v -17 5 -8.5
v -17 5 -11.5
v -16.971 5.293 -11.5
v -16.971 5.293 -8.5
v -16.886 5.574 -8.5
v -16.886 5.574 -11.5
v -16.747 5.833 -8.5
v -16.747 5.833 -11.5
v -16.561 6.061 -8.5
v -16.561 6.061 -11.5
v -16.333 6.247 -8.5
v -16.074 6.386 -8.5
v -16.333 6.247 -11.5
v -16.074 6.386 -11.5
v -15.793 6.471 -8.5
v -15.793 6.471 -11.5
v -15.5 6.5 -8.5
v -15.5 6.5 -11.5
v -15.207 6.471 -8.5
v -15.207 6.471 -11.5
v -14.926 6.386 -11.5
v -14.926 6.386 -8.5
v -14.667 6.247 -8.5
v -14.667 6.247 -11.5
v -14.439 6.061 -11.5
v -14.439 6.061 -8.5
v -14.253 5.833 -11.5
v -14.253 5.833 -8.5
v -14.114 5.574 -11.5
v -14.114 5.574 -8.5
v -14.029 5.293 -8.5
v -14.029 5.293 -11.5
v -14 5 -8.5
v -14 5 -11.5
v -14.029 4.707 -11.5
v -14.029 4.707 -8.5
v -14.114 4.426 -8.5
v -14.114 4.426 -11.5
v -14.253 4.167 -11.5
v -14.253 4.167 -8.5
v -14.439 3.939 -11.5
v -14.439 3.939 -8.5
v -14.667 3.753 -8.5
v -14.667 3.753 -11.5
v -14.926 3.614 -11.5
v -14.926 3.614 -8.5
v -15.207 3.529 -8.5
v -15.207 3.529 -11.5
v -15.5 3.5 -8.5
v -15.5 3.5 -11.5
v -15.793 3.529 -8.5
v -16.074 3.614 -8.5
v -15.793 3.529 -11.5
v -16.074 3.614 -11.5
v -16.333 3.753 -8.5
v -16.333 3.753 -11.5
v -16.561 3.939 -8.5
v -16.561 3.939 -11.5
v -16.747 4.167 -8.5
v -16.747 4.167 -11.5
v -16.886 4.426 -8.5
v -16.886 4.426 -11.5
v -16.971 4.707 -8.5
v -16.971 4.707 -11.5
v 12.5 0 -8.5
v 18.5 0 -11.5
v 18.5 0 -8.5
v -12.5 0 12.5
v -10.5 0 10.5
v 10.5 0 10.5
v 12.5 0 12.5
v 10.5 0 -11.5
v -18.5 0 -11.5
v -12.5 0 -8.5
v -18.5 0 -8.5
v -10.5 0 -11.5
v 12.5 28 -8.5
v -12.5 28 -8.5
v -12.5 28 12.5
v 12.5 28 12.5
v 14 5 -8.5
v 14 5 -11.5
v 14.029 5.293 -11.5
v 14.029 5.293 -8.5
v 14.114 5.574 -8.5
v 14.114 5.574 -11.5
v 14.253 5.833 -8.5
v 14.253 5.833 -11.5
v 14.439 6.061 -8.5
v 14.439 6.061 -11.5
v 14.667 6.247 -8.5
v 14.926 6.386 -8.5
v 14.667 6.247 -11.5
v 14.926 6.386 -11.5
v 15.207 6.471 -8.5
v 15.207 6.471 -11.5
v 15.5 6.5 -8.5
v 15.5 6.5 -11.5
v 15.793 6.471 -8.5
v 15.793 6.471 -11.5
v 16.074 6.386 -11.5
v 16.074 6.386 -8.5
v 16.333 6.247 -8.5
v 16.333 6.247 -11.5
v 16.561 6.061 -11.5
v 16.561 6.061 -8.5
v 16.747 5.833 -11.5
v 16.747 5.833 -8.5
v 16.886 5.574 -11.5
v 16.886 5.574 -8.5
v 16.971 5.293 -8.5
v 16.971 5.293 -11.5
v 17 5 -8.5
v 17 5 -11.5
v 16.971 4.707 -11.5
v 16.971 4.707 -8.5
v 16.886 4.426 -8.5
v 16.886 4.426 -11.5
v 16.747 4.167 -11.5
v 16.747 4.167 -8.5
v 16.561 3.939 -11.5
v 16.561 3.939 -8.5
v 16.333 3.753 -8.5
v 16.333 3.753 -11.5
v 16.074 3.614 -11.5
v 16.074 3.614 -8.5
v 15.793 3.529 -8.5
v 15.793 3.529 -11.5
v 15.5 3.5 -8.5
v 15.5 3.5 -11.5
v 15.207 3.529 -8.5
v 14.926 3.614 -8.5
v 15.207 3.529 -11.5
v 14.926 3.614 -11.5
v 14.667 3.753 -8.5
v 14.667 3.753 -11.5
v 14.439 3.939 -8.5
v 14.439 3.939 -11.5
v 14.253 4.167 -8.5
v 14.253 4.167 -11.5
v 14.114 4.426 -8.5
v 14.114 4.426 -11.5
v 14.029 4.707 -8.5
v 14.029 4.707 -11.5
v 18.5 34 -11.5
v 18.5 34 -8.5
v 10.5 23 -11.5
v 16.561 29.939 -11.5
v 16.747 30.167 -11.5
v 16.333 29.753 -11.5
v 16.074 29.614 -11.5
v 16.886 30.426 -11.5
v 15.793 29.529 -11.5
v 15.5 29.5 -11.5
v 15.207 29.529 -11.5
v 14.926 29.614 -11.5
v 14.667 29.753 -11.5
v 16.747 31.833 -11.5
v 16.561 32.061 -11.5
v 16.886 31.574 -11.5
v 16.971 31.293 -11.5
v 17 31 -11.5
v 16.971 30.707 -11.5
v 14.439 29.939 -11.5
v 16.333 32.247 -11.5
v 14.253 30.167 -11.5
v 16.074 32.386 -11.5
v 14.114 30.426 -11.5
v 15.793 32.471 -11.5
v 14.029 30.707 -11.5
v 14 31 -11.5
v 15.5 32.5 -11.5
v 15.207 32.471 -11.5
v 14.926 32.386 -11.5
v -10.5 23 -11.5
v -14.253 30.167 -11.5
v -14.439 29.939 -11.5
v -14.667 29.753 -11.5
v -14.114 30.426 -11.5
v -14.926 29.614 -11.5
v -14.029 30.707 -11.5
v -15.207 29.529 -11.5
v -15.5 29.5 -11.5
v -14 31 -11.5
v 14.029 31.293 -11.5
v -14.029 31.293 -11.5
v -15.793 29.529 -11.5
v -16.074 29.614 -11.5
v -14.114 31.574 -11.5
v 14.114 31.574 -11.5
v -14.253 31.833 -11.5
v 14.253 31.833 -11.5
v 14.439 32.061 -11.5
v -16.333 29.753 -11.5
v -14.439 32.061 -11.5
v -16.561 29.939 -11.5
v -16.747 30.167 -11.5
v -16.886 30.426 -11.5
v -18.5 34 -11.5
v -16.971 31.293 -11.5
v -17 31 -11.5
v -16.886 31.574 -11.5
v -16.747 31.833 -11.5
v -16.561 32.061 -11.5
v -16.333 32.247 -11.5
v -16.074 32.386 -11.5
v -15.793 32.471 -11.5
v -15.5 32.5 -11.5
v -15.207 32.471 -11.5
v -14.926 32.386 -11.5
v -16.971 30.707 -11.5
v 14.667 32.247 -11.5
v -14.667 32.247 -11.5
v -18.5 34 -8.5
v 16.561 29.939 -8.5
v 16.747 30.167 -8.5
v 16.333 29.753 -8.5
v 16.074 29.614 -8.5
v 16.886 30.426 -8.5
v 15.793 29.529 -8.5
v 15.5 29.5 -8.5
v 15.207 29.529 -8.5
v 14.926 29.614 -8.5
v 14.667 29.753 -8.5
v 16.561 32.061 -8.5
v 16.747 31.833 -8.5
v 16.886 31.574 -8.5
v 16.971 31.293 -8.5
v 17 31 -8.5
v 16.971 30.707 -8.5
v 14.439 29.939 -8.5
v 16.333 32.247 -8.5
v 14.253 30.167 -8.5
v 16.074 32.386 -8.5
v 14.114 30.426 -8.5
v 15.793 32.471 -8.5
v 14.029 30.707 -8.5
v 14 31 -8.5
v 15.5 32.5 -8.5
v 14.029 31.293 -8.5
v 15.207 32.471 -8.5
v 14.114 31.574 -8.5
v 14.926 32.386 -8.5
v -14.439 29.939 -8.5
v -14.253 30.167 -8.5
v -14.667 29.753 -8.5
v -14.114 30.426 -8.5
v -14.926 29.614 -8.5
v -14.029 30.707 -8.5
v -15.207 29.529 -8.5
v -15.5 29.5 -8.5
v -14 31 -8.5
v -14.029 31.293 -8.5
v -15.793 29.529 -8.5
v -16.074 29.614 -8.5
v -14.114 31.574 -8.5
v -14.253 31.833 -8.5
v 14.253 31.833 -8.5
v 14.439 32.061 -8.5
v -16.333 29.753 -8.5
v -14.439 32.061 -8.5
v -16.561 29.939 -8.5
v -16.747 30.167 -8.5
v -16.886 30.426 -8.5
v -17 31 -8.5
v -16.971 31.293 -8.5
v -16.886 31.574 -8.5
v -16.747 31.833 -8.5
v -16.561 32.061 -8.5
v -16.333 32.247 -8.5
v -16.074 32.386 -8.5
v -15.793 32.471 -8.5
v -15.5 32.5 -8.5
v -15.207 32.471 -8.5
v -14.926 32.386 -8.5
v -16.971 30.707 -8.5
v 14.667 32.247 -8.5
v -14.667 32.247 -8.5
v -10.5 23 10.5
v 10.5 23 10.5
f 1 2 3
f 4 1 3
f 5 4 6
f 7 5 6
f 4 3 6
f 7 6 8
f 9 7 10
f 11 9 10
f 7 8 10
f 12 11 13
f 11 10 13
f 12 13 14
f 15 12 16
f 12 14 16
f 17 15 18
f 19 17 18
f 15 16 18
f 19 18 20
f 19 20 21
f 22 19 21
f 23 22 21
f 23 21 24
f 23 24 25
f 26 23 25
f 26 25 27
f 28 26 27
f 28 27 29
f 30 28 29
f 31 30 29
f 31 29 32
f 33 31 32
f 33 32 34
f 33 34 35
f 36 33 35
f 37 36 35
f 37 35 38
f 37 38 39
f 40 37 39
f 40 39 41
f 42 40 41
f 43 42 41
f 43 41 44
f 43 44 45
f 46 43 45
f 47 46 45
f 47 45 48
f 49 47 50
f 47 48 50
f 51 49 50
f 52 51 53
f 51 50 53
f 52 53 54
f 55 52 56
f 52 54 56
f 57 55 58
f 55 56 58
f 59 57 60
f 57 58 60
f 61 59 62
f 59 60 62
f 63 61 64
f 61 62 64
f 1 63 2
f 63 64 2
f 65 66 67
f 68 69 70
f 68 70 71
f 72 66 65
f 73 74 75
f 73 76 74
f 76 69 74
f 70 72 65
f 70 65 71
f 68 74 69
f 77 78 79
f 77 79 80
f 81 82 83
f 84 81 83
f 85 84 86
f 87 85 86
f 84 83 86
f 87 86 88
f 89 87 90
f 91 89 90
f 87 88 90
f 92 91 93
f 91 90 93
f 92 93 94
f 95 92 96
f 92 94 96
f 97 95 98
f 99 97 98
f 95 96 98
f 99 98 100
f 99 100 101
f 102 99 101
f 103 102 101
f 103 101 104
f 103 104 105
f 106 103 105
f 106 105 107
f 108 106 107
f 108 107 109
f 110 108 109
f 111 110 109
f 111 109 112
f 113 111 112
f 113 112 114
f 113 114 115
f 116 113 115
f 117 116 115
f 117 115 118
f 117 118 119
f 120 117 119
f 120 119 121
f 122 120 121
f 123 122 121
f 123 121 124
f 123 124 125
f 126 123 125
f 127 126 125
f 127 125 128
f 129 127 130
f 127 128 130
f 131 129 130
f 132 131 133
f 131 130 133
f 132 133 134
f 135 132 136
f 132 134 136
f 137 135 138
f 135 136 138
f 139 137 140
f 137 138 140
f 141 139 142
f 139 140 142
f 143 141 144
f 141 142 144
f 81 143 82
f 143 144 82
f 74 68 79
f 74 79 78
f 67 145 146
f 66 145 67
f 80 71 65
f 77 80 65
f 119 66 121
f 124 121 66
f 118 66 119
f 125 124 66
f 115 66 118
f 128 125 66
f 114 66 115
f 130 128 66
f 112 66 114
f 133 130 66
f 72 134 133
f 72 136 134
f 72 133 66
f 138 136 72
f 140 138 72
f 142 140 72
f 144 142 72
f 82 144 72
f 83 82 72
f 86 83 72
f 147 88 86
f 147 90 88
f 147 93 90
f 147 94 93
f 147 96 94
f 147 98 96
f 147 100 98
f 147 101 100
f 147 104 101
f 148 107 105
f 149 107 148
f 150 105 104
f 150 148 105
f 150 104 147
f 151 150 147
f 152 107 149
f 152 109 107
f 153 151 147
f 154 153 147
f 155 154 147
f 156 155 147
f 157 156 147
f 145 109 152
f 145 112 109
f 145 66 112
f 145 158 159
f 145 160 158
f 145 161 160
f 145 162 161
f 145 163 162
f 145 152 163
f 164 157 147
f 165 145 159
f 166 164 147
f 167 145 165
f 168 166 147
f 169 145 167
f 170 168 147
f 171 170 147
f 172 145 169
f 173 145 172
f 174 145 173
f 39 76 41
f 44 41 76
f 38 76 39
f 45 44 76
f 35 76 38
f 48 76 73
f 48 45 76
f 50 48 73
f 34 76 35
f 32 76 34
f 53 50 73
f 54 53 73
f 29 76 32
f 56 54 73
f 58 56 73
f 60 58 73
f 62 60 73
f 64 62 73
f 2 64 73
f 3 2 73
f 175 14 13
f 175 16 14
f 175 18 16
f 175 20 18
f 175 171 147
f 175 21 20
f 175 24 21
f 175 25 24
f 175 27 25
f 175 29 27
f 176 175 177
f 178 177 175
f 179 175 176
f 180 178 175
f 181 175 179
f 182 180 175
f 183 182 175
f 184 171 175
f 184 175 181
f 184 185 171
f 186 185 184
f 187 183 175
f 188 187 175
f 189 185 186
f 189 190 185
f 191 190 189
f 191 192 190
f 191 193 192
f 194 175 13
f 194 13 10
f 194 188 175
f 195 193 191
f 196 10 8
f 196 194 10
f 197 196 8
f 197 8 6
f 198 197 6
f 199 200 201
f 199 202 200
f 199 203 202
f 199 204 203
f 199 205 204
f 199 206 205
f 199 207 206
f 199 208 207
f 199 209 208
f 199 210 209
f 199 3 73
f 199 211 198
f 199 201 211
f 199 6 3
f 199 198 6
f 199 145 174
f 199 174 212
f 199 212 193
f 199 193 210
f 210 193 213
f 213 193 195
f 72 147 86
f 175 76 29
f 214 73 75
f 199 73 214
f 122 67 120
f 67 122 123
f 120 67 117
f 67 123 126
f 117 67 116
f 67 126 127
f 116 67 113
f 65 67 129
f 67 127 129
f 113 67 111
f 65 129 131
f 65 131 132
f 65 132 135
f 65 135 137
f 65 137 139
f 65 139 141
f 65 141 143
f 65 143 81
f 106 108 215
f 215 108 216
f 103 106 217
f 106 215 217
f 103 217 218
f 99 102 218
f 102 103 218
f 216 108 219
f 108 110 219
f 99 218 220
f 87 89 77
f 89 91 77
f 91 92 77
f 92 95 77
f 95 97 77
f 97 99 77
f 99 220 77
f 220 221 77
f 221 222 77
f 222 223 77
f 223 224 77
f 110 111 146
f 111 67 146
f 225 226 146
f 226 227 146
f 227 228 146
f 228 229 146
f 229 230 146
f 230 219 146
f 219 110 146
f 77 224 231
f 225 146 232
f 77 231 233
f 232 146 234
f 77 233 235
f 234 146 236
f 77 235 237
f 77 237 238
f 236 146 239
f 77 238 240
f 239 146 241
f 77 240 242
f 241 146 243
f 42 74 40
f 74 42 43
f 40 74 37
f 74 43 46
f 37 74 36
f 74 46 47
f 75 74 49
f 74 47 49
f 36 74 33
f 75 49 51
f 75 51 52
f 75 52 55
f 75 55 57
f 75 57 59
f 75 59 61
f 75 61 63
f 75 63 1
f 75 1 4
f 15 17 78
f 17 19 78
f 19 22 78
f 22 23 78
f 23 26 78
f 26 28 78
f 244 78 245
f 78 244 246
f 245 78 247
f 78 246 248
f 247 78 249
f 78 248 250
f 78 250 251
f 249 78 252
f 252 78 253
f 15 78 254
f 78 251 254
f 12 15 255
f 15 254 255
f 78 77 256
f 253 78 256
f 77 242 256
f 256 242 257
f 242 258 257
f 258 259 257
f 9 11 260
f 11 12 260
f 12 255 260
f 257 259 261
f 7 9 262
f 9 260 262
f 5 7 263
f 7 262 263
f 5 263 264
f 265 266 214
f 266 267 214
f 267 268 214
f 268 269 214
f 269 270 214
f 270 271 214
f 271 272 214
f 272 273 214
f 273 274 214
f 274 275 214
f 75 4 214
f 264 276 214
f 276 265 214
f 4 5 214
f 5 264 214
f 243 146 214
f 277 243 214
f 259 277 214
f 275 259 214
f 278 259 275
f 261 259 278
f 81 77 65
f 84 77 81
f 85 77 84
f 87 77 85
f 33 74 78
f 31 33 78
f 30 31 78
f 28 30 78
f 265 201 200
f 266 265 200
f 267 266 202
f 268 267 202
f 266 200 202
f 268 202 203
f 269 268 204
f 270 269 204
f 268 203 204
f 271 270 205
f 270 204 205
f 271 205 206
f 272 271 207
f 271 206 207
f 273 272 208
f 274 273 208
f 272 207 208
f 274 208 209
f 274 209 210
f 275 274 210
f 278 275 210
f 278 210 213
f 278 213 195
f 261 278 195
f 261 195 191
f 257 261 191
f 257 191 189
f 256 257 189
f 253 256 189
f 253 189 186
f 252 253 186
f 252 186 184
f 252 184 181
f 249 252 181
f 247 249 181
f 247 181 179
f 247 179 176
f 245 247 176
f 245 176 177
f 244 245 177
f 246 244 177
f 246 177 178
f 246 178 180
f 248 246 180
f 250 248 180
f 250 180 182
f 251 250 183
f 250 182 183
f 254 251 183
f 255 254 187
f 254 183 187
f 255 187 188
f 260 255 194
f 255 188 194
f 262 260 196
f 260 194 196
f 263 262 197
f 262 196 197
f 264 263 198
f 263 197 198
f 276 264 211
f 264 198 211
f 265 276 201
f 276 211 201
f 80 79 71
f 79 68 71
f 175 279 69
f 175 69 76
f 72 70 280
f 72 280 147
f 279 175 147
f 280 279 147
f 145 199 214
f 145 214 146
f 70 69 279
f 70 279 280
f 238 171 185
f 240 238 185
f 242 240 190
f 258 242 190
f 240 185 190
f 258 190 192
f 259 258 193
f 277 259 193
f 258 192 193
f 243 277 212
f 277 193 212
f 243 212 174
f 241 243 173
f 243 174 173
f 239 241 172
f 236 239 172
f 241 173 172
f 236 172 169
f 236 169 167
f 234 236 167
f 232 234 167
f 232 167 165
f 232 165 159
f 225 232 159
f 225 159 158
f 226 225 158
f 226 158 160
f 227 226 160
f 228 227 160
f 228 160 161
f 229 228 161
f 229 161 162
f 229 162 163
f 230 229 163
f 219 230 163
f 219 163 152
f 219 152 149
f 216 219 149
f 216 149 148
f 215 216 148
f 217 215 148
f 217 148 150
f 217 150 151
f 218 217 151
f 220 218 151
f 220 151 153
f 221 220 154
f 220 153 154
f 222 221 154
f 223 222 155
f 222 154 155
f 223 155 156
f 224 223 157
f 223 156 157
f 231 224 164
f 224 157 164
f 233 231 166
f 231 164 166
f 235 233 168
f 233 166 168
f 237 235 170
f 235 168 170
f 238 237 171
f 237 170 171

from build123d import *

# Parameters (mm, degrees)
SKETCH_1_W          = 25
SKETCH_1_H          = 25
EXTRUDE_1_DEPTH     = 25
SHELL_2_T           = -2
SKETCH_2_W          = 21
SKETCH_2_H          = 23
CUT_EXTRUDE_1_DEPTH = 25
SKETCH_3_W          = 25
SKETCH_3_H          = 25
EXTRUDE_2_DEPTH     = 3
EXTRUDE_3_DEPTH     = 4
CUT_EXTRUDE_2_DEPTH = 1
SKETCH_7_R          = 1.5
CUT_EXTRUDE_3_DEPTH = 46.543934832


with BuildPart() as part:
    # 草图1 → 凸台-拉伸1 (new body)
    with BuildSketch(Plane(origin=(0, 0, 0), x_dir=(1, 0, 0), z_dir=(0, 1, 0))):
        Rectangle(SKETCH_1_W, SKETCH_1_H)
    extrude(amount=EXTRUDE_1_DEPTH)

    # 抽壳2
    shell_2_openings = [part.faces().sort_by_distance(p)[0] for p in [
        (0, 12.5, -12.5),
    ]]
    offset(amount=SHELL_2_T, openings=shell_2_openings, kind=Kind.INTERSECTION)

    # 草图2 → 切除-拉伸1 (cut)
    with BuildSketch(Plane(origin=(0, 2, 0), x_dir=(1, 0, 0), z_dir=(0, 1, 0))):
        with Locations((0, 1)):
            Rectangle(SKETCH_2_W, SKETCH_2_H)
    extrude(amount=-CUT_EXTRUDE_1_DEPTH, mode=Mode.SUBTRACT)

    # 草图3 → 凸台-拉伸2 (add)
    with BuildSketch(Plane(origin=(0, 25, 0), x_dir=(1, 0, 0), z_dir=(0, 1, 0))):
        Rectangle(SKETCH_3_W, SKETCH_3_H)
    extrude(amount=EXTRUDE_2_DEPTH)

    # 草图5 → 凸台-拉伸3 (add)
    with BuildSketch(Plane(origin=(0, 0, -12.5), x_dir=(-1, 0, 0), z_dir=(0, 0, -1))):
        Polygon((18.5, 0), (18.5, 34), (-18.5, 34), (-18.5, 0), (-12.5, 0), (-12.5, 28), (12.5, 28), (12.5, 0), align=None)
    extrude(amount=-EXTRUDE_3_DEPTH)

    # 草图6 → 切除-拉伸2 (cut)
    with BuildSketch(Plane(origin=(0, 0, -12.5), x_dir=(-1, 0, 0), z_dir=(0, 0, -1))):
        Polygon((10.5, 0), (18.5, 0), (18.5, 34), (-18.5, 34), (-18.5, 0), (-10.5, 0), (-10.5, 23), (10.5, 23), align=None)
    extrude(amount=-CUT_EXTRUDE_2_DEPTH, mode=Mode.SUBTRACT)

    # 草图7 → 切除-拉伸3 (cut, through all)
    with BuildSketch(Plane(origin=(0, 0, -11.5), x_dir=(-1, 0, 0), z_dir=(0, 0, -1))):
        with Locations((-15.5, 5)):
            Circle(SKETCH_7_R)
        with Locations((-15.5, 31)):
            Circle(SKETCH_7_R)
        with Locations((15.5, 5)):
            Circle(SKETCH_7_R)
        with Locations((15.5, 31)):
            Circle(SKETCH_7_R)
    extrude(amount=-CUT_EXTRUDE_3_DEPTH, mode=Mode.SUBTRACT)


solid = part.part
